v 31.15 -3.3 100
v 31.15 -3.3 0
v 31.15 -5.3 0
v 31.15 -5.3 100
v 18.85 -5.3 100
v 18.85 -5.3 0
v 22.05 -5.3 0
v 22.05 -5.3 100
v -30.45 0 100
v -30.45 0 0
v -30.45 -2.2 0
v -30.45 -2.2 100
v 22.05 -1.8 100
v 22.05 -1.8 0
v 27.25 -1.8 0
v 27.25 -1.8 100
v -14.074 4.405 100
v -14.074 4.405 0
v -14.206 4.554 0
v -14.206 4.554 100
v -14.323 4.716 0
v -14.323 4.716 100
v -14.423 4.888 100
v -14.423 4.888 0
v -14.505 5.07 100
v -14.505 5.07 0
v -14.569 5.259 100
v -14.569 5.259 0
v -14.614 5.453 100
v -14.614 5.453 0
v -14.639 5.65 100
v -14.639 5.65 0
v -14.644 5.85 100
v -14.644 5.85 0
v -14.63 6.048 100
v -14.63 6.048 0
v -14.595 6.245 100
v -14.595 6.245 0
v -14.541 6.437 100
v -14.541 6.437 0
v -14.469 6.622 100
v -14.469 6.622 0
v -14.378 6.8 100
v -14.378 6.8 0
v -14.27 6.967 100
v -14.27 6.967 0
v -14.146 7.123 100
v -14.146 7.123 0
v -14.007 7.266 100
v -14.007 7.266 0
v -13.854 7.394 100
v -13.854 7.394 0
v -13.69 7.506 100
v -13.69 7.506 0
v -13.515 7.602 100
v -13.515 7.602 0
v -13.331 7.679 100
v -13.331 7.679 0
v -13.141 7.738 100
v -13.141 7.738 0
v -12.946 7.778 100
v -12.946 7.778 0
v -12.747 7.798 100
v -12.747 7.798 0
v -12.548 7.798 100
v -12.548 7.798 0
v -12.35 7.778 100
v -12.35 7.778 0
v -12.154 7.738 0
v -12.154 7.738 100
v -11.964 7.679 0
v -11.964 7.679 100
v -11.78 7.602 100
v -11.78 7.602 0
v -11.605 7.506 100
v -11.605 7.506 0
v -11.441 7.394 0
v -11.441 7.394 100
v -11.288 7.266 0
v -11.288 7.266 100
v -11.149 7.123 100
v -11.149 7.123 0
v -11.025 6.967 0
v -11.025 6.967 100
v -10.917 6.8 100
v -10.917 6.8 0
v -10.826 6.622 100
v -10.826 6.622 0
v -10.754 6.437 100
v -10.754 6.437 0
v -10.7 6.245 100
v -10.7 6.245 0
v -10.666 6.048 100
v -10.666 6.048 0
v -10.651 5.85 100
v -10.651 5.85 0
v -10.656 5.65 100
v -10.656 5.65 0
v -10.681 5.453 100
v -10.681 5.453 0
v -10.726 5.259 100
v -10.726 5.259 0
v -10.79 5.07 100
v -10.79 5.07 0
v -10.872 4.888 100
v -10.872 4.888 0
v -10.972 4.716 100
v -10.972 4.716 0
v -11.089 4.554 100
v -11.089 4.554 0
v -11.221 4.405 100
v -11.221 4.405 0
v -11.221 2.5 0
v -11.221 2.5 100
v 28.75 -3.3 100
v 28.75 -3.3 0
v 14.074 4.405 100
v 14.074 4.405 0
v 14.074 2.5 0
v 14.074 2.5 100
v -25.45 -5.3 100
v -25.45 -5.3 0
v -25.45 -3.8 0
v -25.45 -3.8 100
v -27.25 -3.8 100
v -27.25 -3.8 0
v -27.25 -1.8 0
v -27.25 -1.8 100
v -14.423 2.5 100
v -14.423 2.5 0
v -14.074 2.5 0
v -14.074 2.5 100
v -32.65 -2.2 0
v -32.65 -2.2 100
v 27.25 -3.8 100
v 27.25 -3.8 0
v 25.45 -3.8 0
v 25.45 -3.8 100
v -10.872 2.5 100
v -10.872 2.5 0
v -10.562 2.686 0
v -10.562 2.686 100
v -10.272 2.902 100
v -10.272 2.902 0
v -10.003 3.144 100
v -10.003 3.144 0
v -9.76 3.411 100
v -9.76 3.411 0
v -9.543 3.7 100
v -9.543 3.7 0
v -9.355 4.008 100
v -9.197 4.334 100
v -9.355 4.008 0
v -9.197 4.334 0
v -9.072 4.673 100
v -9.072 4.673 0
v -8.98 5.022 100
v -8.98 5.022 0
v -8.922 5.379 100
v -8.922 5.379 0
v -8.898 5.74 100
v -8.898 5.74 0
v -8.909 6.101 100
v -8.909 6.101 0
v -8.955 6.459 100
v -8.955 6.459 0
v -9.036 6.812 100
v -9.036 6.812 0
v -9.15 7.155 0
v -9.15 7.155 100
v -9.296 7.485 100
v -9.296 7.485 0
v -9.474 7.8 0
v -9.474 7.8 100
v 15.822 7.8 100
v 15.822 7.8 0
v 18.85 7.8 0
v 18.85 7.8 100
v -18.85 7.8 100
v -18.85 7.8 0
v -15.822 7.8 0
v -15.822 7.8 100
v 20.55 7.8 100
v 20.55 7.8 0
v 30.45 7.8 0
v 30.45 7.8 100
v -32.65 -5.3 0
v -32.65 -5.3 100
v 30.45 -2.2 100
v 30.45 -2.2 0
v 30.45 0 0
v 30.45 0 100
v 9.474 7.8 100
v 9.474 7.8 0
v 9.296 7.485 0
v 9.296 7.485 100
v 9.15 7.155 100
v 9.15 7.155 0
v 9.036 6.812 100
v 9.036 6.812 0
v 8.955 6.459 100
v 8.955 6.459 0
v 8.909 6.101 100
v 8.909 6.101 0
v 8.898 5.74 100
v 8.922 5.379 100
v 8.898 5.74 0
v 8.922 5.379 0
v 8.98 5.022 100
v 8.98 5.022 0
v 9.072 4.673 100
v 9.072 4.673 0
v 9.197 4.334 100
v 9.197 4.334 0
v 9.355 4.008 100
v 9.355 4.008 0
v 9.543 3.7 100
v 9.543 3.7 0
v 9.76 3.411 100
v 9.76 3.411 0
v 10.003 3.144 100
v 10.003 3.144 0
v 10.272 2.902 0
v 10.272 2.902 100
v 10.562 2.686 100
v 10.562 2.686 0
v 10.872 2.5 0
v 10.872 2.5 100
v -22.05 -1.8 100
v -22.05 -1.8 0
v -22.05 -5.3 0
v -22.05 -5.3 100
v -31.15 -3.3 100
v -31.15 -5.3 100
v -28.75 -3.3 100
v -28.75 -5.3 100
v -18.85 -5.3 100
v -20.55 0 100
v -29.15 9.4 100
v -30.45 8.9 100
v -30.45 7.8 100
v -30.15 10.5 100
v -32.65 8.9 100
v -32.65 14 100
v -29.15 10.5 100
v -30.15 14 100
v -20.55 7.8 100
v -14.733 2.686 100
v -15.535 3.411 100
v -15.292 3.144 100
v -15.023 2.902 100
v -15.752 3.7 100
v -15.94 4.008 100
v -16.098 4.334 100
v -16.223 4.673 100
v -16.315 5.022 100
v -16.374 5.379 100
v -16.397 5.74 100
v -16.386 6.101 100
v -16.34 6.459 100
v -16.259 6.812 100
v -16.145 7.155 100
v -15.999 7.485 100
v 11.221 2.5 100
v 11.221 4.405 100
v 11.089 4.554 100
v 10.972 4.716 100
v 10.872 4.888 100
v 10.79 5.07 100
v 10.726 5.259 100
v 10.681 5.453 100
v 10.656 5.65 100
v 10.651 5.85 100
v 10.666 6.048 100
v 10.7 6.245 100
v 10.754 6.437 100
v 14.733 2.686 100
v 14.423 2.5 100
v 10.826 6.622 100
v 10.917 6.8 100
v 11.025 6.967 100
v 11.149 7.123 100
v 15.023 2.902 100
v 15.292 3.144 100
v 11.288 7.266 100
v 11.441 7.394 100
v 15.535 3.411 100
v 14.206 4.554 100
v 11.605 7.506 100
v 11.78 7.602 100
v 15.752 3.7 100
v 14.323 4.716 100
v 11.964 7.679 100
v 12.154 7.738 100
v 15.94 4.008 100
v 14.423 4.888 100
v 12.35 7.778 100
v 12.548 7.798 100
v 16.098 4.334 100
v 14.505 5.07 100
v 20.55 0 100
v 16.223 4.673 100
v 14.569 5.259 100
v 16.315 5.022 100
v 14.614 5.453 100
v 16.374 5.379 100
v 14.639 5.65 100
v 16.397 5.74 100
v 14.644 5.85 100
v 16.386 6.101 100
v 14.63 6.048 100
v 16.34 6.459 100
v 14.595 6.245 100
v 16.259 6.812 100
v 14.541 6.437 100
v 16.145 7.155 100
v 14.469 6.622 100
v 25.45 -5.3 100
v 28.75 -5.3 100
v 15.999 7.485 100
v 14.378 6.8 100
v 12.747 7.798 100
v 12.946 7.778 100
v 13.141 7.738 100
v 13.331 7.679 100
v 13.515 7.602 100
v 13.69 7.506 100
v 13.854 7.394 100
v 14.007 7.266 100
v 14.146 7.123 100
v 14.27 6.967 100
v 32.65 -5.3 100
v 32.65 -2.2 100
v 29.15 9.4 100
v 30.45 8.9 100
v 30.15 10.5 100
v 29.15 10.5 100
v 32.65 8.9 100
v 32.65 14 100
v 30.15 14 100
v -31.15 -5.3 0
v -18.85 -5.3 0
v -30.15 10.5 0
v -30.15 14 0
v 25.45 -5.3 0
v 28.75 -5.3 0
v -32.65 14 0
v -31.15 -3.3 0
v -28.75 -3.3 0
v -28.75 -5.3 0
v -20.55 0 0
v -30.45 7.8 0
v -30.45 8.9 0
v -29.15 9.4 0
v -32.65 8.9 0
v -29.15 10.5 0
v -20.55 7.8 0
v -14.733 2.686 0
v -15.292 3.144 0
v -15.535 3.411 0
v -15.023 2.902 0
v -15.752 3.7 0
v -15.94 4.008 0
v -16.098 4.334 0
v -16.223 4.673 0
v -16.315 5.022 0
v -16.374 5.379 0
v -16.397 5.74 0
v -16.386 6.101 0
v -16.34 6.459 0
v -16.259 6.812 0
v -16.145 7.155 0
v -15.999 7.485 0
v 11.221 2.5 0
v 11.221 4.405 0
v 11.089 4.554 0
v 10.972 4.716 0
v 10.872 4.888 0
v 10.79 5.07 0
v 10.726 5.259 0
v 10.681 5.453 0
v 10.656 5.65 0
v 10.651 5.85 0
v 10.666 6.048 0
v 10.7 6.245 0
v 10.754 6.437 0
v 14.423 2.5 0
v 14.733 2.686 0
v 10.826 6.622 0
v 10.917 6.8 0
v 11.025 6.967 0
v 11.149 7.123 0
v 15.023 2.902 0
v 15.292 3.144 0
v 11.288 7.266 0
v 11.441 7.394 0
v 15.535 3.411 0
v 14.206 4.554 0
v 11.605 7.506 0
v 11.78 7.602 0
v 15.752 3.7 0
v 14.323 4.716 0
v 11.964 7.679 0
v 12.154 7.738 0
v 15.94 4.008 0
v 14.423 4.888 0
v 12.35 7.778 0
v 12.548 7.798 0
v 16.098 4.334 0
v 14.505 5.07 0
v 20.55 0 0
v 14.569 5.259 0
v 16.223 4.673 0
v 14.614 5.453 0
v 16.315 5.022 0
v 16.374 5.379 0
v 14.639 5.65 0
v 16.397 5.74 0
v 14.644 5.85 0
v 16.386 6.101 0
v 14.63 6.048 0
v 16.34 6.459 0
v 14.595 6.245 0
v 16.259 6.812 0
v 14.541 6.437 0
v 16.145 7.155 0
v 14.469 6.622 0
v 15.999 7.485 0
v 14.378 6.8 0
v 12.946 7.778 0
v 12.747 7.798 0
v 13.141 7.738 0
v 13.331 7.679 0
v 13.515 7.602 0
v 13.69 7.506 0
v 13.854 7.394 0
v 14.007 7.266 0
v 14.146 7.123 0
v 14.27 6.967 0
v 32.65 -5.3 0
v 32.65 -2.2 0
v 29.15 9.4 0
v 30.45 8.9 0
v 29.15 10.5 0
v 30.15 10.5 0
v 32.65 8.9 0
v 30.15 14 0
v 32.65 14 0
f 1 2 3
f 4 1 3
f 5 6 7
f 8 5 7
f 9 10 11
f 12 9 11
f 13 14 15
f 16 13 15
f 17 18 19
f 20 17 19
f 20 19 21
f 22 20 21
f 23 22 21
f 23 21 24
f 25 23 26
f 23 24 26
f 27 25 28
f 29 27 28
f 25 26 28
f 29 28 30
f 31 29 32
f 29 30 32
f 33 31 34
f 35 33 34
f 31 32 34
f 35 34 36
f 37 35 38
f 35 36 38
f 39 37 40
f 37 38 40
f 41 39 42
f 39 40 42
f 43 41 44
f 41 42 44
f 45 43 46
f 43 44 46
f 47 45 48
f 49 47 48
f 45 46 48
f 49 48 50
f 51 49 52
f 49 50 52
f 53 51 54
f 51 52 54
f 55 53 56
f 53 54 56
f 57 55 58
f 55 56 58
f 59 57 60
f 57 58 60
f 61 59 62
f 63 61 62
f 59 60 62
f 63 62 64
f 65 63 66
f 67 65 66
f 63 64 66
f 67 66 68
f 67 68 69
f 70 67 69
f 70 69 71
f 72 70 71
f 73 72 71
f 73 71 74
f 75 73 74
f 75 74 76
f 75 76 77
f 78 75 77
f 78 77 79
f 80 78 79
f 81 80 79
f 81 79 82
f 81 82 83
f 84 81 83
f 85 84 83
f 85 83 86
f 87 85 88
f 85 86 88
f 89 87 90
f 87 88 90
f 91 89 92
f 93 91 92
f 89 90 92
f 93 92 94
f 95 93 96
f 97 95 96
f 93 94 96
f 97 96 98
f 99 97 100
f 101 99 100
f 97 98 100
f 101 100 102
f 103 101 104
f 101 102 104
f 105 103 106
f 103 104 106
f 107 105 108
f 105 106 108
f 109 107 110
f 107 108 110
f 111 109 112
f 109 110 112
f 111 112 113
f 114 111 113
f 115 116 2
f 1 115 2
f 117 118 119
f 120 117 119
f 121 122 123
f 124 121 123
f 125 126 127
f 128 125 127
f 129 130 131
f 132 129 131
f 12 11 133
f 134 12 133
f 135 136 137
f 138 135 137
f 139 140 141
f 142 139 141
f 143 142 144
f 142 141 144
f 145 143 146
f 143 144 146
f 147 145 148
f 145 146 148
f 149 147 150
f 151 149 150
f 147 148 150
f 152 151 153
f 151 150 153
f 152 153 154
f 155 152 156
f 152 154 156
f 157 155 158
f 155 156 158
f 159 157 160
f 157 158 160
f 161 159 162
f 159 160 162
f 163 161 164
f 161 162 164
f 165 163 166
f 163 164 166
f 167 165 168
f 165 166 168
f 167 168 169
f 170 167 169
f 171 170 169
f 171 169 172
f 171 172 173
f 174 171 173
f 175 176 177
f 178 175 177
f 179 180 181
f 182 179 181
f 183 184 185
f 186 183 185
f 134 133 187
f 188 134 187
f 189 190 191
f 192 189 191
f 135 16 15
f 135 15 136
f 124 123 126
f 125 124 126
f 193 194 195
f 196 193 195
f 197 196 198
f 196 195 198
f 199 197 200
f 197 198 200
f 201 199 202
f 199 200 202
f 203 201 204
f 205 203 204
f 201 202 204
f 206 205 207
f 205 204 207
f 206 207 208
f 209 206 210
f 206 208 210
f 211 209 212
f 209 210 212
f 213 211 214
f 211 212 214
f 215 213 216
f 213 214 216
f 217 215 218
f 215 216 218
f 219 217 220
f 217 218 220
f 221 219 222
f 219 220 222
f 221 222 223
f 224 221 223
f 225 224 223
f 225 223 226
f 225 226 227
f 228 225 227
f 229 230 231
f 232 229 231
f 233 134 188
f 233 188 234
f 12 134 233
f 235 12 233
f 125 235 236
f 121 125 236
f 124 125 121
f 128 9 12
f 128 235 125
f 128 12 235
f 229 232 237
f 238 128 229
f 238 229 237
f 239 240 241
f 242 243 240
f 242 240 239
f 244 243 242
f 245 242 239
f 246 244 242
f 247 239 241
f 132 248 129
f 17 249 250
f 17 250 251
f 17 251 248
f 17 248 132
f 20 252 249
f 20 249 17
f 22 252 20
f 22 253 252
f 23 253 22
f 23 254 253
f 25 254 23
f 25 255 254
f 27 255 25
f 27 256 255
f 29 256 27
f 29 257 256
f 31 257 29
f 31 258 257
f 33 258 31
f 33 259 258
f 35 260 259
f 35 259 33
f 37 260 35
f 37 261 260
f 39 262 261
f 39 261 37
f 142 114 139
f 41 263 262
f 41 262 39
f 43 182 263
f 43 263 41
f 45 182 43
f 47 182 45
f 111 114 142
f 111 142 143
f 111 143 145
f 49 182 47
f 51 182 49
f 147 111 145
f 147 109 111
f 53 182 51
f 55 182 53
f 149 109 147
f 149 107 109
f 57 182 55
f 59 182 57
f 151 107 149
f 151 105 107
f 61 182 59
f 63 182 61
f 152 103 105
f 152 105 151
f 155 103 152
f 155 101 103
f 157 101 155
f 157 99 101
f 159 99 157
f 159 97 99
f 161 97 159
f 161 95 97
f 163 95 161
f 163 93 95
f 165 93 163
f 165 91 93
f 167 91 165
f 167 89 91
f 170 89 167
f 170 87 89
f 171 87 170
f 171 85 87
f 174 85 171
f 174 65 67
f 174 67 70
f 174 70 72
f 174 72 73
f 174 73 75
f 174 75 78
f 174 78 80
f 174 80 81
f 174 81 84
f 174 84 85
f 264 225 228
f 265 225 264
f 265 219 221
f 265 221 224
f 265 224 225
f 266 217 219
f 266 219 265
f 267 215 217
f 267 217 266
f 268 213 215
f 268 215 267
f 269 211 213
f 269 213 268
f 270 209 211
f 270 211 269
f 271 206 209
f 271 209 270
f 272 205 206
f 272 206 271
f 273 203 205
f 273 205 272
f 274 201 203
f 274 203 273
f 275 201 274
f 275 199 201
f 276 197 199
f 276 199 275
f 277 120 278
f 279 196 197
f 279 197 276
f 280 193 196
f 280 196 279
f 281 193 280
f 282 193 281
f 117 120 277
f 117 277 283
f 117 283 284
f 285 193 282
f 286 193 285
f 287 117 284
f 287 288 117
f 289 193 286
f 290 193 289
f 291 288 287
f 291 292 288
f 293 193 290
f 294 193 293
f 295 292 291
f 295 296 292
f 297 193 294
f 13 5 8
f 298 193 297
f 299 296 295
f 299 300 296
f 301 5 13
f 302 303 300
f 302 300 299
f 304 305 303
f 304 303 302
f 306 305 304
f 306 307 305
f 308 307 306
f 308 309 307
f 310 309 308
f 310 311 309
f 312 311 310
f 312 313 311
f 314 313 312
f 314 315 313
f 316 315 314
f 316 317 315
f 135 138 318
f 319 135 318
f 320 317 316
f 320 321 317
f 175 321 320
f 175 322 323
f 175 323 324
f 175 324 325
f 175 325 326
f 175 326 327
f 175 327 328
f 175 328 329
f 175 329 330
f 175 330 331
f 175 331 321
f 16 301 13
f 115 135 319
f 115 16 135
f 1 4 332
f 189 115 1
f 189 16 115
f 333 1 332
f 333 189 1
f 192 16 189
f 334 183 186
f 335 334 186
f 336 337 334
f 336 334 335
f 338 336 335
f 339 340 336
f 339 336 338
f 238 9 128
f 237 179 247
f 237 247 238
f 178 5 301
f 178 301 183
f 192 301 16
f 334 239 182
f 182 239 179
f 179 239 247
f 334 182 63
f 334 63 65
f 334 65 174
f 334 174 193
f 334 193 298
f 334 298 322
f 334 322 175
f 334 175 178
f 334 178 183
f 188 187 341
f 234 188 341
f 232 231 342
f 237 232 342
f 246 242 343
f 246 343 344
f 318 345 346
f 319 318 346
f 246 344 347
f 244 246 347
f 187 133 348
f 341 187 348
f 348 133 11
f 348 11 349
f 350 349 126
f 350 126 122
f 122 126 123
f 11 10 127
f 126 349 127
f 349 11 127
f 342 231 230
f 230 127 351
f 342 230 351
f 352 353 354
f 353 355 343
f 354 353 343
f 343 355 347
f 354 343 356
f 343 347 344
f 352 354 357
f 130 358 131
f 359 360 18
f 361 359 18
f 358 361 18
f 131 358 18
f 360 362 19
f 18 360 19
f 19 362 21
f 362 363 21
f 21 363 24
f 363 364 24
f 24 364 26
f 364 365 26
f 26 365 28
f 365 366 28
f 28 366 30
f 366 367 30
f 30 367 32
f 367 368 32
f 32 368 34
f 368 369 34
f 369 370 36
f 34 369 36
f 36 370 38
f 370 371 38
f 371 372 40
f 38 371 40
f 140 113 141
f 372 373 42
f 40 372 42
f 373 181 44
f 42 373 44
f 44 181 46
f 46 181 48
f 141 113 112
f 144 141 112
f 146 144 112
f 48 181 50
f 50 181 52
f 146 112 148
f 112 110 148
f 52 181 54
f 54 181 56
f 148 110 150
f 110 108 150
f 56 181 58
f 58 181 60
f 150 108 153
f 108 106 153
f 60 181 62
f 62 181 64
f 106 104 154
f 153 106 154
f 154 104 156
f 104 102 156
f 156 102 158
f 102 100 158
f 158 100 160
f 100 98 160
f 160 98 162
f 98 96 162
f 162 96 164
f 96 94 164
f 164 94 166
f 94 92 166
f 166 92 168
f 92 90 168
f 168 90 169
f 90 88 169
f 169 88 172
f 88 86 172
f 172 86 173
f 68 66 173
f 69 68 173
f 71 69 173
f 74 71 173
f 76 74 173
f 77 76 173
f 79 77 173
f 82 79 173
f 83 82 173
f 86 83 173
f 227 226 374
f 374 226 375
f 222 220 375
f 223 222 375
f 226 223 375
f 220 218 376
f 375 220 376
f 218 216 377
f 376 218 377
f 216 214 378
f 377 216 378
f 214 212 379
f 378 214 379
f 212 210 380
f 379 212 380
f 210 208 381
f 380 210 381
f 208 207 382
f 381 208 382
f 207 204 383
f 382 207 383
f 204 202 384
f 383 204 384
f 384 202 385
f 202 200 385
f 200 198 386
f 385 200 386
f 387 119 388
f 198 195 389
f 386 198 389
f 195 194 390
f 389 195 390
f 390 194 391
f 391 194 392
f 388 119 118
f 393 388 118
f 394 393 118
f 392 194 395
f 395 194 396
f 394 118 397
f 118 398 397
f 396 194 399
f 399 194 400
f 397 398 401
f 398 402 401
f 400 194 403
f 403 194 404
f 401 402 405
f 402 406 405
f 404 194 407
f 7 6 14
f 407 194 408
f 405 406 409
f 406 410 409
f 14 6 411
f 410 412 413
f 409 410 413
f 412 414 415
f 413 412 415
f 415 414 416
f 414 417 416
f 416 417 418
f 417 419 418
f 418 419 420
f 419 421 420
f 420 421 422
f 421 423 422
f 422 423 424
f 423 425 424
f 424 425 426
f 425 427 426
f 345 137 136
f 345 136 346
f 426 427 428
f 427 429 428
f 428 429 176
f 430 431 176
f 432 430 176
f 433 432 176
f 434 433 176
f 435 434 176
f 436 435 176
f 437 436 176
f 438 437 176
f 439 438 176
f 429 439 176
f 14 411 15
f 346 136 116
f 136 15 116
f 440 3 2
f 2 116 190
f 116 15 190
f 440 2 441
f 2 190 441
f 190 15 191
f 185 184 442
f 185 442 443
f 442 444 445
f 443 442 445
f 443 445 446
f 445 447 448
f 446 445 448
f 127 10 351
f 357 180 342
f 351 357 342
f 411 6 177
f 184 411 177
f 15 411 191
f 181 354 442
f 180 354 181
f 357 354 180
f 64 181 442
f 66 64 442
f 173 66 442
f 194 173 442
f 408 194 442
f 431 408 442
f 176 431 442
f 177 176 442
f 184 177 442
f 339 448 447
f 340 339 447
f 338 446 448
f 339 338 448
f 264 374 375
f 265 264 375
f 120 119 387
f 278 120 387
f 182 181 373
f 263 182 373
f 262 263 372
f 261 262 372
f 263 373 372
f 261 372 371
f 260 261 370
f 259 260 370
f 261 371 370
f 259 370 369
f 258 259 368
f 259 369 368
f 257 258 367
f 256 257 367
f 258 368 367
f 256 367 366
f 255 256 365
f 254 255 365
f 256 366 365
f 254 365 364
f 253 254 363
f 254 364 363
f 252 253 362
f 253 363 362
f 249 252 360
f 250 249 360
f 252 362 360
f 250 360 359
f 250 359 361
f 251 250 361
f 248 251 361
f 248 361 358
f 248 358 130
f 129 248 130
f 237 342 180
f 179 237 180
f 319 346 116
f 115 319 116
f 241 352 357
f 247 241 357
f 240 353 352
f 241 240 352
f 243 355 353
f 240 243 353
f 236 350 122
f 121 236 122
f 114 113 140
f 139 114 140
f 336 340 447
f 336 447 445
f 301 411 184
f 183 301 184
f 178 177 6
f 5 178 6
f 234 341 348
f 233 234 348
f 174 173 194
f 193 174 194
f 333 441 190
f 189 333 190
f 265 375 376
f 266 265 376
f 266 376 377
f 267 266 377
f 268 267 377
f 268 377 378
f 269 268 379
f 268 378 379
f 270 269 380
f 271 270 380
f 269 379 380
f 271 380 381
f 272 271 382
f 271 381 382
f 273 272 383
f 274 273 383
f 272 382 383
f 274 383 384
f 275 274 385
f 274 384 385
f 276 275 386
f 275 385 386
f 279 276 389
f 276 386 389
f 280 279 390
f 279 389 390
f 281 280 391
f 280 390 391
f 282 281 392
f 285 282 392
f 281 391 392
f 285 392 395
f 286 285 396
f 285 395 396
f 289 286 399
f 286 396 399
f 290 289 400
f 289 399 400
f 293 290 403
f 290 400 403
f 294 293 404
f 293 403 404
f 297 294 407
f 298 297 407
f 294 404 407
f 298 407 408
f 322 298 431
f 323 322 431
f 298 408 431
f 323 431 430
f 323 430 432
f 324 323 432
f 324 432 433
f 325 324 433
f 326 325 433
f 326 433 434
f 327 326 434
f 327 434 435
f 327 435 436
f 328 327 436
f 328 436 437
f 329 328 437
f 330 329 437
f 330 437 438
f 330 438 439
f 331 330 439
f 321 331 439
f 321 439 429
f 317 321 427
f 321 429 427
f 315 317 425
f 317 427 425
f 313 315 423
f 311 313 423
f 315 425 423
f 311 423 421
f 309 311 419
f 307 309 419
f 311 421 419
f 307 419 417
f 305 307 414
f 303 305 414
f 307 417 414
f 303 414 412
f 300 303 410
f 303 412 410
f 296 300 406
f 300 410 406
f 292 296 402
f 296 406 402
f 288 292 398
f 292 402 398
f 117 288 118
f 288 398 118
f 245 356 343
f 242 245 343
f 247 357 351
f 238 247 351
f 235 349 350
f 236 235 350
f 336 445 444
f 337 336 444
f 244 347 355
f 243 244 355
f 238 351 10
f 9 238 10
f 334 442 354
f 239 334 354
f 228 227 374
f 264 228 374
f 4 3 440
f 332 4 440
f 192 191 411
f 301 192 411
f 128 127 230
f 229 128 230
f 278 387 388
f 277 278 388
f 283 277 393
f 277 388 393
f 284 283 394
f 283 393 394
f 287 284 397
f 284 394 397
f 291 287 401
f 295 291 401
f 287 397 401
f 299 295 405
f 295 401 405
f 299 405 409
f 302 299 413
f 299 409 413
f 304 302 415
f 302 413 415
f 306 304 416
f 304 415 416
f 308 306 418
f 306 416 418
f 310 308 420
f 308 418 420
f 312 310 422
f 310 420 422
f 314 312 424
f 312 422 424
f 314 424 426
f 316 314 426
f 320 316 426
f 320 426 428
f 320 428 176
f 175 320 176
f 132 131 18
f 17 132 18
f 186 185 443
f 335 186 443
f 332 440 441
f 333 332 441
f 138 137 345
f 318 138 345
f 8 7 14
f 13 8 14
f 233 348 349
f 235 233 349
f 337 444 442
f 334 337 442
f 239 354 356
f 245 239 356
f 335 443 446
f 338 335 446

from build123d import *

# Parameters (mm, degrees)
ESTRUSIONE_ESTRUSIONE1_DEPTH = 100


with BuildPart() as part:
    # Schizzo1 → Estrusione-Estrusione1 (new body)
    with BuildSketch(Plane.XY):
        with BuildLine():
            Line((-30.15, 14), (-32.65, 14))
            Line((-32.65, 14), (-32.65, 8.9))
            Line((-32.65, 8.9), (-30.45, 8.9))
            Line((-30.45, 8.9), (-30.45, 7.8))
            Line((-30.45, 7.8), (-20.55, 7.8))
            Line((-20.55, 7.8), (-20.55, 0))
            Line((-20.55, 0), (-30.45, 0))
            Line((-30.45, 0), (-30.45, -2.2))
            Line((-30.45, -2.2), (-32.65, -2.2))
            Line((-32.65, -2.2), (-32.65, -5.3))
            Line((-32.65, -5.3), (-31.15, -5.3))
            Line((-31.15, -5.3), (-31.15, -3.3))
            Line((-31.15, -3.3), (-28.75, -3.3))
            Line((-28.75, -3.3), (-28.75, -5.3))
            Line((-28.75, -5.3), (-25.45, -5.3))
            Line((-25.45, -5.3), (-25.45, -3.8))
            Line((-25.45, -3.8), (-27.25, -3.8))
            Line((-27.25, -3.8), (-27.25, -1.8))
            Line((-27.25, -1.8), (-22.05, -1.8))
            Line((-22.05, -1.8), (-22.05, -5.3))
            Line((-22.05, -5.3), (-18.85, -5.3))
            Line((-18.85, -5.3), (-18.85, 7.8))
            Line((-18.85, 7.8), (-15.821542758, 7.8))
            ThreePointArc((-15.821542758, 7.8), (-16.273540604, 4.846345824), (-14.423395659, 2.5))
            Line((-14.423395659, 2.5), (-14.074102014, 2.5))
            Line((-14.074102014, 2.5), (-14.074102014, 4.405182935))
            ThreePointArc((-14.074102014, 4.405182935), (-12.647585955, 7.8), (-11.221069895, 4.405182935))
            Line((-11.221069895, 4.405182935), (-11.221069895, 2.5))
            Line((-11.221069895, 2.5), (-10.87177625, 2.5))
            ThreePointArc((-10.87177625, 2.5), (-9.021631305, 4.846345824), (-9.473629151, 7.8))
            Line((-9.473629151, 7.8), (0, 7.8))
            Line((0, 7.8), (0, 9.4))
            Line((0, 9.4), (-29.15, 9.4))
            Line((-29.15, 9.4), (-29.15, 10.5))
            Line((-29.15, 10.5), (-30.15, 10.5))
            Line((-30.15, 10.5), (-30.15, 14))
        make_face()
        with BuildLine():
            Line((29.15, 9.4), (0, 9.4))
            Line((0, 9.4), (0, 7.8))
            Line((0, 7.8), (9.473629151, 7.8))
            ThreePointArc((9.473629151, 7.8), (9.021631305, 4.846345824), (10.87177625, 2.5))
            Line((10.87177625, 2.5), (11.221069895, 2.5))
            Line((11.221069895, 2.5), (11.221069895, 4.405182935))
            ThreePointArc((11.221069895, 4.405182935), (12.647585955, 7.8), (14.074102014, 4.405182935))
            Line((14.074102014, 4.405182935), (14.074102014, 2.5))
            Line((14.074102014, 2.5), (14.423395659, 2.5))
            ThreePointArc((14.423395659, 2.5), (16.273540604, 4.846345824), (15.821542758, 7.8))
            Line((15.821542758, 7.8), (18.85, 7.8))
            Line((18.85, 7.8), (18.85, -5.3))
            Line((18.85, -5.3), (22.05, -5.3))
            Line((22.05, -5.3), (22.05, -1.8))
            Line((22.05, -1.8), (27.25, -1.8))
            Line((27.25, -1.8), (27.25, -3.8))
            Line((27.25, -3.8), (25.45, -3.8))
            Line((25.45, -3.8), (25.45, -5.3))
            Line((25.45, -5.3), (28.75, -5.3))
            Line((28.75, -5.3), (28.75, -3.3))
            Line((28.75, -3.3), (31.15, -3.3))
            Line((31.15, -3.3), (31.15, -5.3))
            Line((31.15, -5.3), (32.65, -5.3))
            Line((32.65, -5.3), (32.65, -2.2))
            Line((32.65, -2.2), (30.45, -2.2))
            Line((30.45, -2.2), (30.45, 0))
            Line((30.45, 0), (20.55, 0))
            Line((20.55, 0), (20.55, 7.8))
            Line((20.55, 7.8), (30.45, 7.8))
            Line((30.45, 7.8), (30.45, 8.9))
            Line((30.45, 8.9), (32.65, 8.9))
            Line((32.65, 8.9), (32.65, 14))
            Line((32.65, 14), (30.15, 14))
            Line((30.15, 14), (30.15, 10.5))
            Line((30.15, 10.5), (29.15, 10.5))
            Line((29.15, 10.5), (29.15, 9.4))
        make_face()
    extrude(amount=ESTRUSIONE_ESTRUSIONE1_DEPTH)


solid = part.part
